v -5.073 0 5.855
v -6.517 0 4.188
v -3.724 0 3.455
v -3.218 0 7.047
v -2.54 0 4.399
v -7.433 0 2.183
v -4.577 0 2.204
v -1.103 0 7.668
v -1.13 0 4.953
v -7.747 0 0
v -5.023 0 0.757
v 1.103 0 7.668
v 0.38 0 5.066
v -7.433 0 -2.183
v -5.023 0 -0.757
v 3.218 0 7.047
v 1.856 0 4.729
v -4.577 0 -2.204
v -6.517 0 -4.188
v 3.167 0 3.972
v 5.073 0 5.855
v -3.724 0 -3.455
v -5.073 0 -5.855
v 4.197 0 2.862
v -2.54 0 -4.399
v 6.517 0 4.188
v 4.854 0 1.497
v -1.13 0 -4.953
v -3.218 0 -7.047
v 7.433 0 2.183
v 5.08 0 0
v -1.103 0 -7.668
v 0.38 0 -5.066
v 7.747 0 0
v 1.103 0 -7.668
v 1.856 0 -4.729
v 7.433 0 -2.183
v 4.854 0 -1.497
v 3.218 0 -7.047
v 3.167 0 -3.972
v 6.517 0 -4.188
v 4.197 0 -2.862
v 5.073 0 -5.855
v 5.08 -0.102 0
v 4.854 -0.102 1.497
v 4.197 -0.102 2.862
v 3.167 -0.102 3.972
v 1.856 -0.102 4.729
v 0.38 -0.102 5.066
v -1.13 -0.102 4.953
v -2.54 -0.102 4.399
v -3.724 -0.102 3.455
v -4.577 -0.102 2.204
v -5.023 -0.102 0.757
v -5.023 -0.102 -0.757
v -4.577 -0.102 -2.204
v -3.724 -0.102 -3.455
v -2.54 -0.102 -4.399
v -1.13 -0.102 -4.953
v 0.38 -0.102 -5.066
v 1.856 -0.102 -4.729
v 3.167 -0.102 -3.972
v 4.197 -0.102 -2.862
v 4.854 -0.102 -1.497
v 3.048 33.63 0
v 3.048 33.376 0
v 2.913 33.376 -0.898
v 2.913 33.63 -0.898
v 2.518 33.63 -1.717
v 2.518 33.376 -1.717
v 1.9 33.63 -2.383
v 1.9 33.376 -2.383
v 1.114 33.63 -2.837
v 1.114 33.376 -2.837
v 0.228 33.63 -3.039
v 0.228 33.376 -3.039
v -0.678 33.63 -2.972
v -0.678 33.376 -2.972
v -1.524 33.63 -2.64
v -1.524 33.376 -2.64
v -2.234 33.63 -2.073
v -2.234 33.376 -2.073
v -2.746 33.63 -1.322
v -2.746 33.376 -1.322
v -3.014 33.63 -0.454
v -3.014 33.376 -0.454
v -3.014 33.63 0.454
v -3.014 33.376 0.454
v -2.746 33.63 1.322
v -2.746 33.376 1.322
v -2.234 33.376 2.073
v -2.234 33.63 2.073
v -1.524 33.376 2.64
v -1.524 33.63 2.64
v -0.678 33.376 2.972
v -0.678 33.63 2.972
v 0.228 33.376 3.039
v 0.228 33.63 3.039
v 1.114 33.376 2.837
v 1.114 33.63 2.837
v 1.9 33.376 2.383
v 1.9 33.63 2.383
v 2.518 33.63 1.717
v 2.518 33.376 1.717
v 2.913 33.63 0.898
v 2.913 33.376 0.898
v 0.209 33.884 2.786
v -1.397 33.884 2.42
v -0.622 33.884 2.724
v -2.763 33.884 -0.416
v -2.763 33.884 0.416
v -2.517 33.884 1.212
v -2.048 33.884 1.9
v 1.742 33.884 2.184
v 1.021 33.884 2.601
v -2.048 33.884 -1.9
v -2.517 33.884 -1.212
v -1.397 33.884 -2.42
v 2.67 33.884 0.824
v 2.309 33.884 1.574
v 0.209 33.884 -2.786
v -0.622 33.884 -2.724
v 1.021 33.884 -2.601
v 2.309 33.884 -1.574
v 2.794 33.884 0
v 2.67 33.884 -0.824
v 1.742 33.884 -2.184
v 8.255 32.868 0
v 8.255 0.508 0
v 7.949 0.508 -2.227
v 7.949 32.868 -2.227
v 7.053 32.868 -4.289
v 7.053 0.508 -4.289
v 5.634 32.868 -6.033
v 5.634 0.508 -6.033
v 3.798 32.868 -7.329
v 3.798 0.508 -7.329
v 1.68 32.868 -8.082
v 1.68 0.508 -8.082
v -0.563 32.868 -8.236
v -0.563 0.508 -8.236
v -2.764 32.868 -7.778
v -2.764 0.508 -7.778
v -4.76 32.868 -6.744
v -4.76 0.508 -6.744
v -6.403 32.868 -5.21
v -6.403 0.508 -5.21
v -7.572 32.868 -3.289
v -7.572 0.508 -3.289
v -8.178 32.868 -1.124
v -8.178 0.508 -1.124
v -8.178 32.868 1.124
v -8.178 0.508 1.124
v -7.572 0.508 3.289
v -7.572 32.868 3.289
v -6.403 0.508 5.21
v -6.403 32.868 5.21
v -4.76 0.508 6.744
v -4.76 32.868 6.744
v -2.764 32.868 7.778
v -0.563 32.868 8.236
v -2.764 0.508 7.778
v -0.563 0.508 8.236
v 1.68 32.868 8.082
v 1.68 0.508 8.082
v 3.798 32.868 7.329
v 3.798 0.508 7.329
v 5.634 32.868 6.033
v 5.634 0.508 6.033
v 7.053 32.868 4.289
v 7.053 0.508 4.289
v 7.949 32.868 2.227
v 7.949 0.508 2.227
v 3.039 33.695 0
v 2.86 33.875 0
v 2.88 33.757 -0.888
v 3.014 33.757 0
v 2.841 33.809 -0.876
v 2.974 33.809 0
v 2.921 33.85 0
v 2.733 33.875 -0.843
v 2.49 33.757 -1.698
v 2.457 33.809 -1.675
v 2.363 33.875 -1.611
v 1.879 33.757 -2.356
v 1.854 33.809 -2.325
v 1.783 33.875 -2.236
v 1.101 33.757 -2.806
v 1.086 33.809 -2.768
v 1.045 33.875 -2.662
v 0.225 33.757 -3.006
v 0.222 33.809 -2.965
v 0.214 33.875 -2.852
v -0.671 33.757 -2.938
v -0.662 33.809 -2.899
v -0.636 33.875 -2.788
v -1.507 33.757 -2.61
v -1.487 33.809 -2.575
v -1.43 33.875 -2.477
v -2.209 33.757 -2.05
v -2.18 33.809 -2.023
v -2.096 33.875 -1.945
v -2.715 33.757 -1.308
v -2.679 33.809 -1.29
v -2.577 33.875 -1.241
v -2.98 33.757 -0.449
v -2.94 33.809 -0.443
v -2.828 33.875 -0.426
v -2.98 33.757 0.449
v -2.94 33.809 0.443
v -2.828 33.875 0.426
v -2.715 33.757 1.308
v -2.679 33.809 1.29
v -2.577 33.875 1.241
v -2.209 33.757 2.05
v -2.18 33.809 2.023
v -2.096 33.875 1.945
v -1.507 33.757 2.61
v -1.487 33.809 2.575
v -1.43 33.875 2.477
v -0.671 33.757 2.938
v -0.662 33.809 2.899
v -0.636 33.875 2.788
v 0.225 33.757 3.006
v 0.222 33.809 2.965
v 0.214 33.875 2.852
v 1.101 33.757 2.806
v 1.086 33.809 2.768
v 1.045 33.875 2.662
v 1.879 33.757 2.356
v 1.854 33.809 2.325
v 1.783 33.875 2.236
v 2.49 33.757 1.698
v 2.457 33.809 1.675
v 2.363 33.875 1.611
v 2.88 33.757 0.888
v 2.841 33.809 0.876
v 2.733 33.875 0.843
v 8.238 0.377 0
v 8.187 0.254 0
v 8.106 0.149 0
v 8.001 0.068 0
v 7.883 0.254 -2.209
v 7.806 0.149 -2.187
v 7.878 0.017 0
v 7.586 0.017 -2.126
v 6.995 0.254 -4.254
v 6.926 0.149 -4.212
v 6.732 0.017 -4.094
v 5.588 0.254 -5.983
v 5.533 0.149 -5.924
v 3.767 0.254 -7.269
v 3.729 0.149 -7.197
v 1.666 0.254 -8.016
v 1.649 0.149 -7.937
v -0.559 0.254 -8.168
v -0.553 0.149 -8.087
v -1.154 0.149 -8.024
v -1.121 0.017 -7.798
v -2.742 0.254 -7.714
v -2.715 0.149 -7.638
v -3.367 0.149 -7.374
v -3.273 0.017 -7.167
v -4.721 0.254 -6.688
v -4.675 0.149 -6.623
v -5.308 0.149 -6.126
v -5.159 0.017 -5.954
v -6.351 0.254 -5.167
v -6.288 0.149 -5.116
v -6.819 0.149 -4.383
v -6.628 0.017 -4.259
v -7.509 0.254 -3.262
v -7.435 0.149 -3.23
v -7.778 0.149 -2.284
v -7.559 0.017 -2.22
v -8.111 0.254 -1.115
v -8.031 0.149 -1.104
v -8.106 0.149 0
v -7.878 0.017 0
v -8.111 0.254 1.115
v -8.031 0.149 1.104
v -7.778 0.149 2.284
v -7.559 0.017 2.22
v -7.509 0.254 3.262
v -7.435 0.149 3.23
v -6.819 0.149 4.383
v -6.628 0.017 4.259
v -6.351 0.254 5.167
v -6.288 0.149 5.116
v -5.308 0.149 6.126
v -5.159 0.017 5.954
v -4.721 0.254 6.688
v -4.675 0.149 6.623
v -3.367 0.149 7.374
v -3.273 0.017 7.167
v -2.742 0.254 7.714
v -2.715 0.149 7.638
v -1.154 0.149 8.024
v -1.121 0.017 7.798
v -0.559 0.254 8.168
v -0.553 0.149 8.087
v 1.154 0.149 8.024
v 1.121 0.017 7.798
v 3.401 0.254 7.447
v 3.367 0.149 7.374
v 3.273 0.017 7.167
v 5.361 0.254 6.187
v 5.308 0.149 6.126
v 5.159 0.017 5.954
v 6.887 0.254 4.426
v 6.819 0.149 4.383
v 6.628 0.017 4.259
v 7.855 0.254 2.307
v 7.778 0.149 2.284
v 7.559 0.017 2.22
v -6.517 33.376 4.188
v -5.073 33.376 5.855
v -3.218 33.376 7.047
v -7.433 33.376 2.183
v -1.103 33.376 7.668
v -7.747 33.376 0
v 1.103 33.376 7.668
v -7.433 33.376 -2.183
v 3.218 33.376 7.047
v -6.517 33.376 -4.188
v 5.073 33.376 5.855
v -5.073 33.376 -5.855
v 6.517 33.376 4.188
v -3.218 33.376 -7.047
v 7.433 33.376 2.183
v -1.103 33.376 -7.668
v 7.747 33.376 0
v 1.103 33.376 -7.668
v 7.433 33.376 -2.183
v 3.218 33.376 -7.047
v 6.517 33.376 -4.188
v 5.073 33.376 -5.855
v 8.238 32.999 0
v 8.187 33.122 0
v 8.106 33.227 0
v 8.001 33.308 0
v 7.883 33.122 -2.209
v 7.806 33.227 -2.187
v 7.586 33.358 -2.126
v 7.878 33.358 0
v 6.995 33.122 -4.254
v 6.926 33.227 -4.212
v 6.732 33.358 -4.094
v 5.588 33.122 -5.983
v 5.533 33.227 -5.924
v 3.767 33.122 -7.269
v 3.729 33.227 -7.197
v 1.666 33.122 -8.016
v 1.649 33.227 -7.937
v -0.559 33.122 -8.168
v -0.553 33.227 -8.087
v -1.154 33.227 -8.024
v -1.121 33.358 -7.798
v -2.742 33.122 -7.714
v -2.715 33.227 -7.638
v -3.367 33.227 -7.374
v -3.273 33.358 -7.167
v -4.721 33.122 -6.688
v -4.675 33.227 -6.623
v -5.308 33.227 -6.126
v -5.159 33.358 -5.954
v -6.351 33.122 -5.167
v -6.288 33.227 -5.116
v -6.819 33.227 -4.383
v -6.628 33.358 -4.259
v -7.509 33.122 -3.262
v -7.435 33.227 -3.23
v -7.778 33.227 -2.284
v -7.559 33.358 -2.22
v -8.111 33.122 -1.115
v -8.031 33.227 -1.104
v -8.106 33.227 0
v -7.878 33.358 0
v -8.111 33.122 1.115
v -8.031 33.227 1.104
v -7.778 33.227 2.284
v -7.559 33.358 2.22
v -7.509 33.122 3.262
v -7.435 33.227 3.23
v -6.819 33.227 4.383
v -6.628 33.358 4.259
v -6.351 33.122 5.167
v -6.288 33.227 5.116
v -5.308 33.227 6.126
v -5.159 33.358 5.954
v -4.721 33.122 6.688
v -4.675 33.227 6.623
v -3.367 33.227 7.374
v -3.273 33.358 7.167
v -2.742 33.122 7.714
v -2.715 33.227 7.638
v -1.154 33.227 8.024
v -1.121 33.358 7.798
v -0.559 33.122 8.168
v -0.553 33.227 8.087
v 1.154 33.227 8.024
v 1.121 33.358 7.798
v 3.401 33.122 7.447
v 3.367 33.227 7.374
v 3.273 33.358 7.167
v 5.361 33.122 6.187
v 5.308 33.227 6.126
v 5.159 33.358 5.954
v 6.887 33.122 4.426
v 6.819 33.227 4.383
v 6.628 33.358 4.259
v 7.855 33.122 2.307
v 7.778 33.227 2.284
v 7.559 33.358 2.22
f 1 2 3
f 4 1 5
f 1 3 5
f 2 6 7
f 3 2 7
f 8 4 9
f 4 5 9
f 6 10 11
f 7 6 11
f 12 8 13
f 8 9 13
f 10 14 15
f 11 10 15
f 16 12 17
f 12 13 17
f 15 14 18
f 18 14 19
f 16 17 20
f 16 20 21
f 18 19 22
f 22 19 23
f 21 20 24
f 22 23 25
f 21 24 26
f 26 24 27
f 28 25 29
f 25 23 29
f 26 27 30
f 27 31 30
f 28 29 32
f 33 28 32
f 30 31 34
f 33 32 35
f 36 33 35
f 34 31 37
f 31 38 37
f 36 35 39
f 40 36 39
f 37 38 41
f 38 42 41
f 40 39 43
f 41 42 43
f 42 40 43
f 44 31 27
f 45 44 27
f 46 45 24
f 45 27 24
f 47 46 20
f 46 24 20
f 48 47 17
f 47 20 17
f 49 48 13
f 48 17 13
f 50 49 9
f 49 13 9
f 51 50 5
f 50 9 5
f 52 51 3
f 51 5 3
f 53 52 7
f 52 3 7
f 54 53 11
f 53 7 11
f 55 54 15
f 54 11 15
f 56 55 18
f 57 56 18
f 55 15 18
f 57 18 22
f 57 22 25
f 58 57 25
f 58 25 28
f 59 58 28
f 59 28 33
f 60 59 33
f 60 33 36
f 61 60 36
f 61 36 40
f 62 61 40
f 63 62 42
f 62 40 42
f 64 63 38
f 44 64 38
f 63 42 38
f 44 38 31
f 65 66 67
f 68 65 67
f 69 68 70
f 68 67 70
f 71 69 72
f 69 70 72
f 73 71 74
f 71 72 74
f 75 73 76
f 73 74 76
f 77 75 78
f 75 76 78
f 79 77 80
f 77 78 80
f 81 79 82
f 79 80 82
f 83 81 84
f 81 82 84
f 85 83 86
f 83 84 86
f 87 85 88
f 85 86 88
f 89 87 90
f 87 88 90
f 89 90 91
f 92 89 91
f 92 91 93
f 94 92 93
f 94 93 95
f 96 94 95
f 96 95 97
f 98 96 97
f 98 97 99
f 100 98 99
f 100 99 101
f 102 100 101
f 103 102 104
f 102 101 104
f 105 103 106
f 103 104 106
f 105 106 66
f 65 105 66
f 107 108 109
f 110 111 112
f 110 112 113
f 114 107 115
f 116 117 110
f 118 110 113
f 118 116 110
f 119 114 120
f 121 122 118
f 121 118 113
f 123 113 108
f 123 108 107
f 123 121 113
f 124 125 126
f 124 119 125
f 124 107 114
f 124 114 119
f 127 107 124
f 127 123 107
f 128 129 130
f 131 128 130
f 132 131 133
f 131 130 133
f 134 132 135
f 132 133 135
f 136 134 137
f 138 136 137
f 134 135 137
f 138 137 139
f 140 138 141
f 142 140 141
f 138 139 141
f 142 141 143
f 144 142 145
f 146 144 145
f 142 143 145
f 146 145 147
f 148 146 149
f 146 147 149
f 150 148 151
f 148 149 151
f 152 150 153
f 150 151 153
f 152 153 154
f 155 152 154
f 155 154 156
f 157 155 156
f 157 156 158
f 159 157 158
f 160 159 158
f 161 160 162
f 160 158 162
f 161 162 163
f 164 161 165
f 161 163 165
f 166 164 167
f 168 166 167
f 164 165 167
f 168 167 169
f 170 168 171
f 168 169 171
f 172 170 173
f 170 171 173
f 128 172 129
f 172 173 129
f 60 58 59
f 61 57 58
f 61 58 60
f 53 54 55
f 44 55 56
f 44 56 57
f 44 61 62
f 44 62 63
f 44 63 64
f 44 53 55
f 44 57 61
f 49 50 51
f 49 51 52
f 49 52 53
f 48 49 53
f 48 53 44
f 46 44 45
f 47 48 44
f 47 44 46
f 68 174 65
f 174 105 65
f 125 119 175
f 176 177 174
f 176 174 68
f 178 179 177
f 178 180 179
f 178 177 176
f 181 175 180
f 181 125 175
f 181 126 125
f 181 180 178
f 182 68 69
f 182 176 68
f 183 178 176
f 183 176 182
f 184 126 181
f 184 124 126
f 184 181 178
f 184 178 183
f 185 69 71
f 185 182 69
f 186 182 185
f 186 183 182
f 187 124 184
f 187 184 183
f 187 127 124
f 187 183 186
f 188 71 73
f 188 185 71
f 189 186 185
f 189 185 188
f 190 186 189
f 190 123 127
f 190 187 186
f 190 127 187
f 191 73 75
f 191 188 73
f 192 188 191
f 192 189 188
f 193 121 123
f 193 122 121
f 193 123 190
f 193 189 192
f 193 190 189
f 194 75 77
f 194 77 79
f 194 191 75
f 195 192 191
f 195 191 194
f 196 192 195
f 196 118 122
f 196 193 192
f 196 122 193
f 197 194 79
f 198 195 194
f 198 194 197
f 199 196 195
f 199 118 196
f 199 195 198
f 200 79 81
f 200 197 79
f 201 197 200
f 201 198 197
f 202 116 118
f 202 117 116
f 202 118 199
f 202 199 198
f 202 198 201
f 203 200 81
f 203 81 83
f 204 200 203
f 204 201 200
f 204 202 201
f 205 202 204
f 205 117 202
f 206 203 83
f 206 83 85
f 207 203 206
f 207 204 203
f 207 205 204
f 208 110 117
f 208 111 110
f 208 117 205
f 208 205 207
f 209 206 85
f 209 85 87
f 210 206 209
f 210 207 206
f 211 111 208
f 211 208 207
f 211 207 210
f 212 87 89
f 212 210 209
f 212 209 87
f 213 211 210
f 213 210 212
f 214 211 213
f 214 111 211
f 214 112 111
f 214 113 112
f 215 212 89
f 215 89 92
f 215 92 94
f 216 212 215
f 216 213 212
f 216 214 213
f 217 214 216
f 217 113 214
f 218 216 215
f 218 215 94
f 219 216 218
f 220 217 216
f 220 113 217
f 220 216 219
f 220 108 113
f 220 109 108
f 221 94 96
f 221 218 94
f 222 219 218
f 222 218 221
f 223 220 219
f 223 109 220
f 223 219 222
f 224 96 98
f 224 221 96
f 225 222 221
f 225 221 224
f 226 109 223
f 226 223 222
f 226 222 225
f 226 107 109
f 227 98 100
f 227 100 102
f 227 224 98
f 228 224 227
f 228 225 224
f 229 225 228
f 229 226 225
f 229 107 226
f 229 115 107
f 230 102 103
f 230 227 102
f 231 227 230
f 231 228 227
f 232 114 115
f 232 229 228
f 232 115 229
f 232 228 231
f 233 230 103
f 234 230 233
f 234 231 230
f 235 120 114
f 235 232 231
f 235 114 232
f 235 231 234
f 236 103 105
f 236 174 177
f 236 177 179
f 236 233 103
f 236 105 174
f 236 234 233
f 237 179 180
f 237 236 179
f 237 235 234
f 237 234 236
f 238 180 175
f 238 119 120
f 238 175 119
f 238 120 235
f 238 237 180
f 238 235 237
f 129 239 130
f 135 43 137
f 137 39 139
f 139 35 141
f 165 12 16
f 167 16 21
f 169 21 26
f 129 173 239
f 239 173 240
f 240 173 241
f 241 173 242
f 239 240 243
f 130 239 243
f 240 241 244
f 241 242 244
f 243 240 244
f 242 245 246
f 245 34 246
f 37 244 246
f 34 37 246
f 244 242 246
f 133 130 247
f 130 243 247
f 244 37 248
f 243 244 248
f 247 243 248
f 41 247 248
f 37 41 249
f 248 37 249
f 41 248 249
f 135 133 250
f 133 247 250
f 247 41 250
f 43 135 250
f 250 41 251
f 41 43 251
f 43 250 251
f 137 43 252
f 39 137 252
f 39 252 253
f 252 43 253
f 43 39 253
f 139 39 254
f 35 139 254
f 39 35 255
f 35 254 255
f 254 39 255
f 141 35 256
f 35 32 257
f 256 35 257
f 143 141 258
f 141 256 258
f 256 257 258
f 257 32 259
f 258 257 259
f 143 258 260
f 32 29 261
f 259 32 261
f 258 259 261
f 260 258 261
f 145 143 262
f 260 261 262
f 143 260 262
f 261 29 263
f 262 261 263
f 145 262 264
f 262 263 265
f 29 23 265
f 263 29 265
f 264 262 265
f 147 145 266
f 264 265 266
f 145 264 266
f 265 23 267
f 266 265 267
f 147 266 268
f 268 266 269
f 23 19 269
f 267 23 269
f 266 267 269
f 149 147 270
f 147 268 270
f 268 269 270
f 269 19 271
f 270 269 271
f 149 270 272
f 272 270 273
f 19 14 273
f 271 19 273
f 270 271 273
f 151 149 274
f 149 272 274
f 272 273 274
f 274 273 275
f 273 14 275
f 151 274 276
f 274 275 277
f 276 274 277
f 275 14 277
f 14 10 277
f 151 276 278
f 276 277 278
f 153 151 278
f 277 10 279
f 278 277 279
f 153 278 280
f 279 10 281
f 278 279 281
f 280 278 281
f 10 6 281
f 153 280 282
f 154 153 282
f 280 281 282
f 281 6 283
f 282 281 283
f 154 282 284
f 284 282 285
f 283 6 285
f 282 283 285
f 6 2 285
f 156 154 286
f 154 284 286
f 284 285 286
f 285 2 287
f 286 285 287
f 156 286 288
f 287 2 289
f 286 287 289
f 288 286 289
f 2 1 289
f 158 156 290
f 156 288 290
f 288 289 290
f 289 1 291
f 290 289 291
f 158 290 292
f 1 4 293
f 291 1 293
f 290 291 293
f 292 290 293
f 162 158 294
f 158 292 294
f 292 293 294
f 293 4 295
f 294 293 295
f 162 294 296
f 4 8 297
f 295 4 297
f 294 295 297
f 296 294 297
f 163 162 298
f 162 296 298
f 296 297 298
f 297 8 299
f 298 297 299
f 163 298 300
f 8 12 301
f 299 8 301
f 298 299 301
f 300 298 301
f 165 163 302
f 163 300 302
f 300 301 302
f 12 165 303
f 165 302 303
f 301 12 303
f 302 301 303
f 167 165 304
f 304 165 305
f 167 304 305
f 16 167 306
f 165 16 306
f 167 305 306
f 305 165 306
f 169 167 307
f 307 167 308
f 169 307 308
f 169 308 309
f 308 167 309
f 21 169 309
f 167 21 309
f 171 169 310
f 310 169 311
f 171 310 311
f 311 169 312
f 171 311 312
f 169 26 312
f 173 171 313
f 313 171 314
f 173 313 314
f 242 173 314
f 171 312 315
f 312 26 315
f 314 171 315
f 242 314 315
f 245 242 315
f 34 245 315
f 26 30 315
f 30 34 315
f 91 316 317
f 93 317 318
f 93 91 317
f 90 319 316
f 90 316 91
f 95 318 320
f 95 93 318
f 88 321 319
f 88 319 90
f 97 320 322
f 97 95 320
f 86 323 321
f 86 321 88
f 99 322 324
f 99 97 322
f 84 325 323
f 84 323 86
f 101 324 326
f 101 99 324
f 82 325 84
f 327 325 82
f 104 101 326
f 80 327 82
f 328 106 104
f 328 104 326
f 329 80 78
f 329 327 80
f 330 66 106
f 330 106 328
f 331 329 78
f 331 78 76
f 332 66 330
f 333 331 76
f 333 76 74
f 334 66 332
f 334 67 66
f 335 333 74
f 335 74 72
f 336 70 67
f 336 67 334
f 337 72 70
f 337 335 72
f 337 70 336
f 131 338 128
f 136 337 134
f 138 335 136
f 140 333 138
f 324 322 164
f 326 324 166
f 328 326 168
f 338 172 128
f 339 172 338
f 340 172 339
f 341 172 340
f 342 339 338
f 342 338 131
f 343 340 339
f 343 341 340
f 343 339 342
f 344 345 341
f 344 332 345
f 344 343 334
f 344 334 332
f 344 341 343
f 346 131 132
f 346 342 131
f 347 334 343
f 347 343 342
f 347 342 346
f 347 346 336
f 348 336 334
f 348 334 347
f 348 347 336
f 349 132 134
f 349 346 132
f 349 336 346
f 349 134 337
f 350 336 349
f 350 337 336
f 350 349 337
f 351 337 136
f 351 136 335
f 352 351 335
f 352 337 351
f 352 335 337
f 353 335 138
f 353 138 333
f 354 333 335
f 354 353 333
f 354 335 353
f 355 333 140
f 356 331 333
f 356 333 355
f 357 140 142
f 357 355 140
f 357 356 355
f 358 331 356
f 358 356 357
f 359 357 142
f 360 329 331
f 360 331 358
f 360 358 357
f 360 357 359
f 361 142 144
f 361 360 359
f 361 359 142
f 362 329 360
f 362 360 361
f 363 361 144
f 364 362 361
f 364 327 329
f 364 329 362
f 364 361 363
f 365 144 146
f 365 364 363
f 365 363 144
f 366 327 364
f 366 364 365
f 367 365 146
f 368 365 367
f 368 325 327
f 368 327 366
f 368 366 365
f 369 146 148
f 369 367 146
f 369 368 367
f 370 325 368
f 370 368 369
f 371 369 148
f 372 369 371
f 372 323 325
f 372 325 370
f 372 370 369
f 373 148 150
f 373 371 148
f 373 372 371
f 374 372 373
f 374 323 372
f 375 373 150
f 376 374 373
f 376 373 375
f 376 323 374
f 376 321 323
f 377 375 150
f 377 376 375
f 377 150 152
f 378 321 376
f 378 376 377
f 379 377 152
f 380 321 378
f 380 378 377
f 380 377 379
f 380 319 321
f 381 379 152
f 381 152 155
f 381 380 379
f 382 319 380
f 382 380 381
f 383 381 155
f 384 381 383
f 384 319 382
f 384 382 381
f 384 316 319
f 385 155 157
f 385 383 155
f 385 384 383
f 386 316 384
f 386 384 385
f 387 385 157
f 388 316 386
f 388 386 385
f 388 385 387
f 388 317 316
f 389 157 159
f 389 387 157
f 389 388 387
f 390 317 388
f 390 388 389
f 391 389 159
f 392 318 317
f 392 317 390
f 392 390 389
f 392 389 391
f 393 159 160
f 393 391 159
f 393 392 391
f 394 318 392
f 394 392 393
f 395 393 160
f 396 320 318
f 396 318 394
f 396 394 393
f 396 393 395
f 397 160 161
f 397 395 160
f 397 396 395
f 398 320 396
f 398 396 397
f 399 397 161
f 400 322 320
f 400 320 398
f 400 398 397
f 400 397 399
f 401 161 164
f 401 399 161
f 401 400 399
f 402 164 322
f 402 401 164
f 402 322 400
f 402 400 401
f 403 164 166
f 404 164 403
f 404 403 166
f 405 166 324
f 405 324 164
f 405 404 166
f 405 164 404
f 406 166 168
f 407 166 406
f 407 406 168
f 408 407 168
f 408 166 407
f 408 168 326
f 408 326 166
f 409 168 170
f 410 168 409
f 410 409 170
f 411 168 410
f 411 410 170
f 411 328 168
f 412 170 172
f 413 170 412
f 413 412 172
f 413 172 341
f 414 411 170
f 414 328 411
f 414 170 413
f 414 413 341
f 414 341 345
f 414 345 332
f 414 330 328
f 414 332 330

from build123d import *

# Parameters (mm, degrees)
SKETCH1_R           = 8.255
BOSS_EXTRUDE1_DEPTH = 33.3756
SKETCH2_R           = 3.048
BOSS_EXTRUDE2_DEPTH = 0.508
SKETCH3_R           = 5.08
BOSS_EXTRUDE3_DEPTH = 0.1016
FILLET1_R           = 0.508
FILLET2_R           = 0.254


with BuildPart() as part:
    # Sketch1 → Boss-Extrude1 (new body)
    with BuildSketch(Plane(origin=(0, 0, 0), x_dir=(1, 0, 0), z_dir=(0, 1, 0))):
        Circle(SKETCH1_R)
    extrude(amount=BOSS_EXTRUDE1_DEPTH)

    # Sketch2 → Boss-Extrude2 (add)
    with BuildSketch(Plane(origin=(0, 33.3756, 0), x_dir=(1, 0, 0), z_dir=(0, 1, 0))):
        Circle(SKETCH2_R)
    extrude(amount=BOSS_EXTRUDE2_DEPTH)

    # Sketch3 → Boss-Extrude3 (add)
    with BuildSketch(Plane.XZ):
        Circle(SKETCH3_R)
    extrude(amount=BOSS_EXTRUDE3_DEPTH)

    # Fillet1
    fillet1_edges = [part.edges().sort_by_distance(p)[0] for p in [
        (-8.255, 0, 0),
        (-8.255, 33.3756, 0),
    ]]
    fillet(fillet1_edges, radius=FILLET1_R)

    # Fillet2
    fillet2_edges = [part.edges().sort_by_distance(p)[0] for p in [
        (-3.048, 33.8836, 0),
    ]]
    fillet(fillet2_edges, radius=FILLET2_R)


solid = part.part
